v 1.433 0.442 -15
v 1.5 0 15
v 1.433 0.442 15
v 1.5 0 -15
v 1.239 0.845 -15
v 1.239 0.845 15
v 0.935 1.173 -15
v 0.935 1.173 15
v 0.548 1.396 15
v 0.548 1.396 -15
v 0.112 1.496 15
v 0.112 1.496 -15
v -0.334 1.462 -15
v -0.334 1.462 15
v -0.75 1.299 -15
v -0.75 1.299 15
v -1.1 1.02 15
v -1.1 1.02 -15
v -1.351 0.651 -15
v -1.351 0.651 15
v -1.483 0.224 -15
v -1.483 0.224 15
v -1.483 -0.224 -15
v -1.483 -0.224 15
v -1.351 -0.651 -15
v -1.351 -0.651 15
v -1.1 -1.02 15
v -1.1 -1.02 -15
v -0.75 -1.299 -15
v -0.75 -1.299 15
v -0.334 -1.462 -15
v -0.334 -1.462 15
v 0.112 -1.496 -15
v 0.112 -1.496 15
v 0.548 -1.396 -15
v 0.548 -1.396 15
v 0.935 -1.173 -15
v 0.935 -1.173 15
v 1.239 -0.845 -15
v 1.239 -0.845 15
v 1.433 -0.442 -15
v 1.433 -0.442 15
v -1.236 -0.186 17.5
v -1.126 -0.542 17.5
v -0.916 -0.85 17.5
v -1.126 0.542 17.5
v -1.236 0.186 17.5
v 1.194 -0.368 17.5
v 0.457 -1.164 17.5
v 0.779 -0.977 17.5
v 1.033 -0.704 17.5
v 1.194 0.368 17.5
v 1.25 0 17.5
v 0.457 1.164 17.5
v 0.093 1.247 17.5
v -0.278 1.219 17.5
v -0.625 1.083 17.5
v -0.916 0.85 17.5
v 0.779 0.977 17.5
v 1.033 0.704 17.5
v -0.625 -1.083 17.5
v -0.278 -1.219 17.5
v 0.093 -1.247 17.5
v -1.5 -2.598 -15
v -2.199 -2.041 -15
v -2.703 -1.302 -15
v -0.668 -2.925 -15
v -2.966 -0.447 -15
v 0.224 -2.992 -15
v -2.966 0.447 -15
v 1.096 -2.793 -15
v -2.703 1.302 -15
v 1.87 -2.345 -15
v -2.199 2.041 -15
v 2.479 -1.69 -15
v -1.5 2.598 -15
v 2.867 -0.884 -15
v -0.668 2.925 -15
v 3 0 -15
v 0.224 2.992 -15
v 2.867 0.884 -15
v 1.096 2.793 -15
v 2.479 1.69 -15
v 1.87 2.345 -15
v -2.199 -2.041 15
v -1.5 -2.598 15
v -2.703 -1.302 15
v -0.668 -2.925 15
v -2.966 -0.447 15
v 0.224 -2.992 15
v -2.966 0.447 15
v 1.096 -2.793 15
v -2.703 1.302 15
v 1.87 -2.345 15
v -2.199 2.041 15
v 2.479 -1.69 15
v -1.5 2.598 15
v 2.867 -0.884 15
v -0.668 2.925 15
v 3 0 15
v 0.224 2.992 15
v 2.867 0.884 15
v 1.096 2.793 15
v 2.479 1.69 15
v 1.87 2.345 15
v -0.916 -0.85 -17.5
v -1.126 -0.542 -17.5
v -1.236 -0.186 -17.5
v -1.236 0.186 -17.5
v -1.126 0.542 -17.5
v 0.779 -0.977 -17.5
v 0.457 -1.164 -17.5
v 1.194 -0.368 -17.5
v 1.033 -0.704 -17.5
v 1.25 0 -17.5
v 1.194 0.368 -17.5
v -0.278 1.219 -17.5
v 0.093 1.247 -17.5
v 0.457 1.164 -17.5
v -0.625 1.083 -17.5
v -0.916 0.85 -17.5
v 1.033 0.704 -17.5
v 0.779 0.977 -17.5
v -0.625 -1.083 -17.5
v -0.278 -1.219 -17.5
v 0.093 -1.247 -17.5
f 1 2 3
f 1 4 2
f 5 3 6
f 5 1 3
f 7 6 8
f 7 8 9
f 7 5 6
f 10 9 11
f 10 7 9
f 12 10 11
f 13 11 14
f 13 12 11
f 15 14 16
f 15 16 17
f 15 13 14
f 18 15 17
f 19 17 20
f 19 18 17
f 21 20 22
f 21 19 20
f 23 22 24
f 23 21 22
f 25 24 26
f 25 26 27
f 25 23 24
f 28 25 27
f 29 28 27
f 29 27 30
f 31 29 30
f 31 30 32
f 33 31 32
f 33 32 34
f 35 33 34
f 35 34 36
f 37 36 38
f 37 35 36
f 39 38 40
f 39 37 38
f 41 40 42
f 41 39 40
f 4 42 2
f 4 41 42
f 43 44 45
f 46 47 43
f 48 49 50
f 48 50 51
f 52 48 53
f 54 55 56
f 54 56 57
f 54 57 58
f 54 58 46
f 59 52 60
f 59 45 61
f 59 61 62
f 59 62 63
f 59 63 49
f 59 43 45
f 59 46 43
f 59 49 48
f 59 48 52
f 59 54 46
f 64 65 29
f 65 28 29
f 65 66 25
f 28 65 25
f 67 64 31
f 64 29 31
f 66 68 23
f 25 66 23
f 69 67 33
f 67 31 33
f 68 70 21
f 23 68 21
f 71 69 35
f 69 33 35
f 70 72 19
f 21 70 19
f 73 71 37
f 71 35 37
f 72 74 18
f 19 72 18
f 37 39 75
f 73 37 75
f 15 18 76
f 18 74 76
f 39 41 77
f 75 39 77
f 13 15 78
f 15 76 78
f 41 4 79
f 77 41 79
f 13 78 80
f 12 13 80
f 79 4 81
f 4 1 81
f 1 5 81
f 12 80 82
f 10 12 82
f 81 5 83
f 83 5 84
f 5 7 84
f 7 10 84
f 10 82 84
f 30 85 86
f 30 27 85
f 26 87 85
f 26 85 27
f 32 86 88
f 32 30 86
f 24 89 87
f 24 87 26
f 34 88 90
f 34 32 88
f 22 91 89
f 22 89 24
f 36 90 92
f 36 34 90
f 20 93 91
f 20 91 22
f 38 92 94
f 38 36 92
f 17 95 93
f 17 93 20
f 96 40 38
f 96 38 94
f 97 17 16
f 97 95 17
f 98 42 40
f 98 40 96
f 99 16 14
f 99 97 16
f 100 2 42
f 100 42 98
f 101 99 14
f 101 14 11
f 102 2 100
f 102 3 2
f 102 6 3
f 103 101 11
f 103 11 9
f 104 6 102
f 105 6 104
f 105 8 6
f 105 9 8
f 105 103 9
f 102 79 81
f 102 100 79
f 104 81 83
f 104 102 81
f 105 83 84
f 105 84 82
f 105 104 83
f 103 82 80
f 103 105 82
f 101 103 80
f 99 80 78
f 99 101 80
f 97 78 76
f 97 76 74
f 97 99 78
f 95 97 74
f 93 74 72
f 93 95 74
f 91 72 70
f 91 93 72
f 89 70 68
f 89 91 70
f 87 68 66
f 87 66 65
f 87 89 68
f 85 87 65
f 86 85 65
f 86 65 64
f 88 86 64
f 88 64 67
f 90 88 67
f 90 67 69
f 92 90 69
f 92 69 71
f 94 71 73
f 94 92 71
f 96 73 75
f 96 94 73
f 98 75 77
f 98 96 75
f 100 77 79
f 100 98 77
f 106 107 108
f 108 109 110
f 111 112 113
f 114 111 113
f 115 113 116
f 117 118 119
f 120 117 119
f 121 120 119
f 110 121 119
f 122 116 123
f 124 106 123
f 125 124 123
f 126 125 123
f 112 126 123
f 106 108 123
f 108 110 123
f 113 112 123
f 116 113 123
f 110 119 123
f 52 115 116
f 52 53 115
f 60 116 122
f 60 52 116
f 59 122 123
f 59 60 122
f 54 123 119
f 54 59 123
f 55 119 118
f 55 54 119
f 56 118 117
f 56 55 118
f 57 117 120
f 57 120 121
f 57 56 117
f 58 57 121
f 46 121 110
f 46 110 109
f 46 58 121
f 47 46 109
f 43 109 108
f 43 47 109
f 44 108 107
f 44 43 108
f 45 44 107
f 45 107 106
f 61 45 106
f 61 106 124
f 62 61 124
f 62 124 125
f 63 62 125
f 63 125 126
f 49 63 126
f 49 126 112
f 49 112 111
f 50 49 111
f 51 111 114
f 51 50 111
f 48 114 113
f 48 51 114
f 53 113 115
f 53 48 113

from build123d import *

# Parameters (mm, degrees)
SKETCH1_R         = 1.25
CENTRALAXIS_DEPTH = 17.5
SKETCH2_R         = 3
SKETCH2_R_2       = 1.5
ROLLINGAXIS_DEPTH = 15


with BuildPart() as part:
    # Sketch1 → CentralAxis (new body, symmetric)
    with BuildSketch(Plane.XY):
        Circle(SKETCH1_R)
    extrude(amount=CENTRALAXIS_DEPTH, both=True)


with BuildPart() as body_2:
    # Sketch2 → RollingAxis (new body, symmetric)
    with BuildSketch(Plane.XY):
        Circle(SKETCH2_R)
        Circle(SKETCH2_R_2, mode=Mode.SUBTRACT)
    extrude(amount=ROLLINGAXIS_DEPTH, both=True)


solid = Compound([part.part, body_2.part])
